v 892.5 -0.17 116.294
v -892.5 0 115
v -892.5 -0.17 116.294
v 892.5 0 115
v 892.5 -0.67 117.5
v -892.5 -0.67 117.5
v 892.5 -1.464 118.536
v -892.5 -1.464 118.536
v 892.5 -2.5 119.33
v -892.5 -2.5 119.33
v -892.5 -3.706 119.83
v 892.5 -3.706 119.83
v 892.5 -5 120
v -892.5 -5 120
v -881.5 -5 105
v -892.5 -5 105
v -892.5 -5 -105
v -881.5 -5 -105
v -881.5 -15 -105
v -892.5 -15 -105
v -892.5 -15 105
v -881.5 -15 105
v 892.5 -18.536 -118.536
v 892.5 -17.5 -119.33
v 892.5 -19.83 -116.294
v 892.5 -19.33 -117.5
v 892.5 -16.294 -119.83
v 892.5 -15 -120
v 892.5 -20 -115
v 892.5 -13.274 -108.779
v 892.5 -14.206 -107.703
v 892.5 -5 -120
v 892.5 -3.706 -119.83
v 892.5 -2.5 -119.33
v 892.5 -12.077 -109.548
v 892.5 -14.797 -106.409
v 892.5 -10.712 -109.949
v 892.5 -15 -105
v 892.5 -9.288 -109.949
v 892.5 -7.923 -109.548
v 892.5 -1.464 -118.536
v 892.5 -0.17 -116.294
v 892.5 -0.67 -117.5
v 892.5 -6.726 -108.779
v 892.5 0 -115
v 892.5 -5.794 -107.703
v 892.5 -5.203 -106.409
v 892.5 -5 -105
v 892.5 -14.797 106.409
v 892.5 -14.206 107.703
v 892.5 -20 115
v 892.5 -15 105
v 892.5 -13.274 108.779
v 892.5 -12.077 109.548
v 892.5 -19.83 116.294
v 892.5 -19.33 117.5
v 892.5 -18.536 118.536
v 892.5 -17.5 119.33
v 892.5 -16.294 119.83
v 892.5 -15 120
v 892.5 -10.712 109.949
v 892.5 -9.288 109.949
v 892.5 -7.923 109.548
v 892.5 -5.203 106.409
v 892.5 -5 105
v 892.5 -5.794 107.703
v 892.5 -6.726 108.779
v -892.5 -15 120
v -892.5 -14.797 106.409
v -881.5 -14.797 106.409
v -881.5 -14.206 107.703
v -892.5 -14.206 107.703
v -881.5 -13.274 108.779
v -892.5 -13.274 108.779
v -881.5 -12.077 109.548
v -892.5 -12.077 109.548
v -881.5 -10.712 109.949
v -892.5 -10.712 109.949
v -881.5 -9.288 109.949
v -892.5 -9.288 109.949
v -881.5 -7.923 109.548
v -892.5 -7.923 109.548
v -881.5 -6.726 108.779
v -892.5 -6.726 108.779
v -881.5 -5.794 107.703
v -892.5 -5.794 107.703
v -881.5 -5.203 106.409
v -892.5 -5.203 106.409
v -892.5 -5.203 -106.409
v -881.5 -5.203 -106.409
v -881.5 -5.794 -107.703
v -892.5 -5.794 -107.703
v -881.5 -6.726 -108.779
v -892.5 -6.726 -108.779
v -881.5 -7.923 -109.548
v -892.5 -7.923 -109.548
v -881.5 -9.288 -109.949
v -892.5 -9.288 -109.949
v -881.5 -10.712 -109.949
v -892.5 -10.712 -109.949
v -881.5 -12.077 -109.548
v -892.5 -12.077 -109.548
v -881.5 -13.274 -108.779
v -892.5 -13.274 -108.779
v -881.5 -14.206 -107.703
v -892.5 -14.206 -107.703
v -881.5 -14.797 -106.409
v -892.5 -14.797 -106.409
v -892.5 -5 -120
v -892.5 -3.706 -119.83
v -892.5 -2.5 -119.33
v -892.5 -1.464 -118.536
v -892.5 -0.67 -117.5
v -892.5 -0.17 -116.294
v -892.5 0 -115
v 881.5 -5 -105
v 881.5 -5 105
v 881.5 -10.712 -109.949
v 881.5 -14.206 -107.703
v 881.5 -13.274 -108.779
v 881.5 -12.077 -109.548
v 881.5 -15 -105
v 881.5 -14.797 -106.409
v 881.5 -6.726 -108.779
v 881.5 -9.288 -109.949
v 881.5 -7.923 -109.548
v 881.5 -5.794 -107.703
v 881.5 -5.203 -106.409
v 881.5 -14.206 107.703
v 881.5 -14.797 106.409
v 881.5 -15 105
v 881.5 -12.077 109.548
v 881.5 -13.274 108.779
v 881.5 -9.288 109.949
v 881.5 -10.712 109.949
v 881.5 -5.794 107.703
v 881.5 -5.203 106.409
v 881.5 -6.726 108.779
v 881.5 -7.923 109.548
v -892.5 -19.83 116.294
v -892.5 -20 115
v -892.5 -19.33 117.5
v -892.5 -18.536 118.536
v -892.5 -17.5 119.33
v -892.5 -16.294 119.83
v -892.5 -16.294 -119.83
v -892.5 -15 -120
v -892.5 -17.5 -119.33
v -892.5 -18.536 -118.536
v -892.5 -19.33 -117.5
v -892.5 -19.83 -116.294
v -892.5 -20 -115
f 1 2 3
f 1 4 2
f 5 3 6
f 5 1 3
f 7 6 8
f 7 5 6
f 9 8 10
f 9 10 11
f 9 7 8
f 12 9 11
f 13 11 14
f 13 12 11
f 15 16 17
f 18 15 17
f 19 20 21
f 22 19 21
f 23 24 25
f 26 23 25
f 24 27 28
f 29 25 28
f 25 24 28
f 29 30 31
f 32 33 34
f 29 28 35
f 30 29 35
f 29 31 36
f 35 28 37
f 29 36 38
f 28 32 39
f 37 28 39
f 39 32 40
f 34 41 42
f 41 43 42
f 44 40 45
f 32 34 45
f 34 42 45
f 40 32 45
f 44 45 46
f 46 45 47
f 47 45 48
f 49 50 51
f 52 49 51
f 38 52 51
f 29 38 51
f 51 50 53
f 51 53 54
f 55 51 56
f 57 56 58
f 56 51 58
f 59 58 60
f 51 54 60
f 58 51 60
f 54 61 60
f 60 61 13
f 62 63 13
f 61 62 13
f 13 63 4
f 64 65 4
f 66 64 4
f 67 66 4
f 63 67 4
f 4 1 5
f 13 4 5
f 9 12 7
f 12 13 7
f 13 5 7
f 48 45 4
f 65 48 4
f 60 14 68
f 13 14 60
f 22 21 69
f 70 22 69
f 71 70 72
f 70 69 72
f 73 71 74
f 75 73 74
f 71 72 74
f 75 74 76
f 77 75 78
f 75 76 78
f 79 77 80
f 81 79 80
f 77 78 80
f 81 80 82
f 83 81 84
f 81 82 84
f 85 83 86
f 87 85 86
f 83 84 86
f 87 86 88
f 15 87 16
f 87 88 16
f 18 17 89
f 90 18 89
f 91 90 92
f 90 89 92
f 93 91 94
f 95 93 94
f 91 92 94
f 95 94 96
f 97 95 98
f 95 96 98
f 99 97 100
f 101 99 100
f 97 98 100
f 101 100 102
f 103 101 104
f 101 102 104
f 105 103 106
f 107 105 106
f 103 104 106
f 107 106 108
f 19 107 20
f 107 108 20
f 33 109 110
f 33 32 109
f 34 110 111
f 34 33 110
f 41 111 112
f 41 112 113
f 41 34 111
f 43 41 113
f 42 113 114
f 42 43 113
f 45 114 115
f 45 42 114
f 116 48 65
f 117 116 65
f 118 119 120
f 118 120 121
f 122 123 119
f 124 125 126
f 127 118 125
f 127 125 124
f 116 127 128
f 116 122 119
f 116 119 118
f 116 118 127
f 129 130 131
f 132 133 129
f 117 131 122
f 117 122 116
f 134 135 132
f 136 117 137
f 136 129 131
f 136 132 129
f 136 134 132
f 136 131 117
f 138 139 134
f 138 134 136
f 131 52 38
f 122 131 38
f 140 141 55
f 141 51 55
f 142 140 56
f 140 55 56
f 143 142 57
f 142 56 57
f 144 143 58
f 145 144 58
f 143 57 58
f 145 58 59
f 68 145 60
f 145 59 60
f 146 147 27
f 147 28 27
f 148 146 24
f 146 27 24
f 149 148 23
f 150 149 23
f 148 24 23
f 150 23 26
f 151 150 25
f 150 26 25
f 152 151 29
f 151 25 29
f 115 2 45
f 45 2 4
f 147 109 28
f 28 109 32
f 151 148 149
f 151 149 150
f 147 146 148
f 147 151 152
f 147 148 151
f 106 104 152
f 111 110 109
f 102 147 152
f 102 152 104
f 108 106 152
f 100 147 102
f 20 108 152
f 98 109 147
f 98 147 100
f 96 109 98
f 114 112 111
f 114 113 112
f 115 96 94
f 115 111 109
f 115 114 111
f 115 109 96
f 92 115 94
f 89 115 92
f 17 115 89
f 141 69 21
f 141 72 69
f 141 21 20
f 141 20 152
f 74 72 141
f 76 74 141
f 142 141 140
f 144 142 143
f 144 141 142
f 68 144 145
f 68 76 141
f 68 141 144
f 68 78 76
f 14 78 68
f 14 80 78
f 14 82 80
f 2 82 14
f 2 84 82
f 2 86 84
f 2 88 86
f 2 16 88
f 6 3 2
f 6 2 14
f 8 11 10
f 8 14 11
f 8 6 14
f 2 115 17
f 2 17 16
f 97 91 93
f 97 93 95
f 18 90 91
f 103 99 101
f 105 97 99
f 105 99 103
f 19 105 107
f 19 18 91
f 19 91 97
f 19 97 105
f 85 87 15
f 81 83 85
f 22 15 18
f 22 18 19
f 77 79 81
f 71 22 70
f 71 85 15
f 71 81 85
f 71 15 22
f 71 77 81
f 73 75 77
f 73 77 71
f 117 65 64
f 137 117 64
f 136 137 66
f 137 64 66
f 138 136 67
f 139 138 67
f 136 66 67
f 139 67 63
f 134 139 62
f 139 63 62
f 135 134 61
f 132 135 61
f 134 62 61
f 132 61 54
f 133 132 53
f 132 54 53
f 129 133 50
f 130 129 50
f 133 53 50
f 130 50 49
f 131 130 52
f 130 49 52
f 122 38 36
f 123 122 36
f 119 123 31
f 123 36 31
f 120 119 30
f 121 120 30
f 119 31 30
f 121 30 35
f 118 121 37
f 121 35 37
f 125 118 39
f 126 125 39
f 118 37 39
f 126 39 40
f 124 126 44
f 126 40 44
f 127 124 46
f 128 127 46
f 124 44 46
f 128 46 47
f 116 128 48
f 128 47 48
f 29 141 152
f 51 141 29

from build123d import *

# Parameters (mm, degrees)
F0_W     = 1785
F0_H     = 240
F1_DEPTH = 20
F3_DEPTH = 11
F5_DEPTH = 11
F6_R     = 5


with BuildPart() as f1:
    # F0 (on Front) → F1 (new body)
    with BuildSketch(Plane.XZ):
        Rectangle(F0_W, F0_H)
    extrude(amount=F1_DEPTH)

    # F2 (on face) → F3 (cut)
    with BuildSketch(Plane(origin=(-892.5, 0, 0), x_dir=(0, -1, 0), z_dir=(-1, 0, 0))):
        with BuildLine():
            Line((5, 105), (5, -105))
            ThreePointArc((5, -105), (10, -110), (15, -105))
            Line((15, -105), (15, 105))
            ThreePointArc((15, 105), (10, 110), (5, 105))
        make_face()
    extrude(amount=-F3_DEPTH, mode=Mode.SUBTRACT)

    # F4 (on face) → F5 (cut)
    with BuildSketch(Plane.YZ.offset(892.5)):
        with BuildLine():
            Line((-5, -105), (-5, 105))
            ThreePointArc((-5, 105), (-10, 110), (-15, 105))
            Line((-15, 105), (-15, -105))
            ThreePointArc((-15, -105), (-10, -110), (-5, -105))
        make_face()
    extrude(amount=-F5_DEPTH, mode=Mode.SUBTRACT)

    # F6
    f6_edges = [f1.edges().sort_by_distance(p)[0] for p in [
        (0, 0, 120),
        (0, -20, 120),
        (0, 0, -120),
        (0, -20, -120),
    ]]
    fillet(f6_edges, radius=F6_R)


solid = f1.part
